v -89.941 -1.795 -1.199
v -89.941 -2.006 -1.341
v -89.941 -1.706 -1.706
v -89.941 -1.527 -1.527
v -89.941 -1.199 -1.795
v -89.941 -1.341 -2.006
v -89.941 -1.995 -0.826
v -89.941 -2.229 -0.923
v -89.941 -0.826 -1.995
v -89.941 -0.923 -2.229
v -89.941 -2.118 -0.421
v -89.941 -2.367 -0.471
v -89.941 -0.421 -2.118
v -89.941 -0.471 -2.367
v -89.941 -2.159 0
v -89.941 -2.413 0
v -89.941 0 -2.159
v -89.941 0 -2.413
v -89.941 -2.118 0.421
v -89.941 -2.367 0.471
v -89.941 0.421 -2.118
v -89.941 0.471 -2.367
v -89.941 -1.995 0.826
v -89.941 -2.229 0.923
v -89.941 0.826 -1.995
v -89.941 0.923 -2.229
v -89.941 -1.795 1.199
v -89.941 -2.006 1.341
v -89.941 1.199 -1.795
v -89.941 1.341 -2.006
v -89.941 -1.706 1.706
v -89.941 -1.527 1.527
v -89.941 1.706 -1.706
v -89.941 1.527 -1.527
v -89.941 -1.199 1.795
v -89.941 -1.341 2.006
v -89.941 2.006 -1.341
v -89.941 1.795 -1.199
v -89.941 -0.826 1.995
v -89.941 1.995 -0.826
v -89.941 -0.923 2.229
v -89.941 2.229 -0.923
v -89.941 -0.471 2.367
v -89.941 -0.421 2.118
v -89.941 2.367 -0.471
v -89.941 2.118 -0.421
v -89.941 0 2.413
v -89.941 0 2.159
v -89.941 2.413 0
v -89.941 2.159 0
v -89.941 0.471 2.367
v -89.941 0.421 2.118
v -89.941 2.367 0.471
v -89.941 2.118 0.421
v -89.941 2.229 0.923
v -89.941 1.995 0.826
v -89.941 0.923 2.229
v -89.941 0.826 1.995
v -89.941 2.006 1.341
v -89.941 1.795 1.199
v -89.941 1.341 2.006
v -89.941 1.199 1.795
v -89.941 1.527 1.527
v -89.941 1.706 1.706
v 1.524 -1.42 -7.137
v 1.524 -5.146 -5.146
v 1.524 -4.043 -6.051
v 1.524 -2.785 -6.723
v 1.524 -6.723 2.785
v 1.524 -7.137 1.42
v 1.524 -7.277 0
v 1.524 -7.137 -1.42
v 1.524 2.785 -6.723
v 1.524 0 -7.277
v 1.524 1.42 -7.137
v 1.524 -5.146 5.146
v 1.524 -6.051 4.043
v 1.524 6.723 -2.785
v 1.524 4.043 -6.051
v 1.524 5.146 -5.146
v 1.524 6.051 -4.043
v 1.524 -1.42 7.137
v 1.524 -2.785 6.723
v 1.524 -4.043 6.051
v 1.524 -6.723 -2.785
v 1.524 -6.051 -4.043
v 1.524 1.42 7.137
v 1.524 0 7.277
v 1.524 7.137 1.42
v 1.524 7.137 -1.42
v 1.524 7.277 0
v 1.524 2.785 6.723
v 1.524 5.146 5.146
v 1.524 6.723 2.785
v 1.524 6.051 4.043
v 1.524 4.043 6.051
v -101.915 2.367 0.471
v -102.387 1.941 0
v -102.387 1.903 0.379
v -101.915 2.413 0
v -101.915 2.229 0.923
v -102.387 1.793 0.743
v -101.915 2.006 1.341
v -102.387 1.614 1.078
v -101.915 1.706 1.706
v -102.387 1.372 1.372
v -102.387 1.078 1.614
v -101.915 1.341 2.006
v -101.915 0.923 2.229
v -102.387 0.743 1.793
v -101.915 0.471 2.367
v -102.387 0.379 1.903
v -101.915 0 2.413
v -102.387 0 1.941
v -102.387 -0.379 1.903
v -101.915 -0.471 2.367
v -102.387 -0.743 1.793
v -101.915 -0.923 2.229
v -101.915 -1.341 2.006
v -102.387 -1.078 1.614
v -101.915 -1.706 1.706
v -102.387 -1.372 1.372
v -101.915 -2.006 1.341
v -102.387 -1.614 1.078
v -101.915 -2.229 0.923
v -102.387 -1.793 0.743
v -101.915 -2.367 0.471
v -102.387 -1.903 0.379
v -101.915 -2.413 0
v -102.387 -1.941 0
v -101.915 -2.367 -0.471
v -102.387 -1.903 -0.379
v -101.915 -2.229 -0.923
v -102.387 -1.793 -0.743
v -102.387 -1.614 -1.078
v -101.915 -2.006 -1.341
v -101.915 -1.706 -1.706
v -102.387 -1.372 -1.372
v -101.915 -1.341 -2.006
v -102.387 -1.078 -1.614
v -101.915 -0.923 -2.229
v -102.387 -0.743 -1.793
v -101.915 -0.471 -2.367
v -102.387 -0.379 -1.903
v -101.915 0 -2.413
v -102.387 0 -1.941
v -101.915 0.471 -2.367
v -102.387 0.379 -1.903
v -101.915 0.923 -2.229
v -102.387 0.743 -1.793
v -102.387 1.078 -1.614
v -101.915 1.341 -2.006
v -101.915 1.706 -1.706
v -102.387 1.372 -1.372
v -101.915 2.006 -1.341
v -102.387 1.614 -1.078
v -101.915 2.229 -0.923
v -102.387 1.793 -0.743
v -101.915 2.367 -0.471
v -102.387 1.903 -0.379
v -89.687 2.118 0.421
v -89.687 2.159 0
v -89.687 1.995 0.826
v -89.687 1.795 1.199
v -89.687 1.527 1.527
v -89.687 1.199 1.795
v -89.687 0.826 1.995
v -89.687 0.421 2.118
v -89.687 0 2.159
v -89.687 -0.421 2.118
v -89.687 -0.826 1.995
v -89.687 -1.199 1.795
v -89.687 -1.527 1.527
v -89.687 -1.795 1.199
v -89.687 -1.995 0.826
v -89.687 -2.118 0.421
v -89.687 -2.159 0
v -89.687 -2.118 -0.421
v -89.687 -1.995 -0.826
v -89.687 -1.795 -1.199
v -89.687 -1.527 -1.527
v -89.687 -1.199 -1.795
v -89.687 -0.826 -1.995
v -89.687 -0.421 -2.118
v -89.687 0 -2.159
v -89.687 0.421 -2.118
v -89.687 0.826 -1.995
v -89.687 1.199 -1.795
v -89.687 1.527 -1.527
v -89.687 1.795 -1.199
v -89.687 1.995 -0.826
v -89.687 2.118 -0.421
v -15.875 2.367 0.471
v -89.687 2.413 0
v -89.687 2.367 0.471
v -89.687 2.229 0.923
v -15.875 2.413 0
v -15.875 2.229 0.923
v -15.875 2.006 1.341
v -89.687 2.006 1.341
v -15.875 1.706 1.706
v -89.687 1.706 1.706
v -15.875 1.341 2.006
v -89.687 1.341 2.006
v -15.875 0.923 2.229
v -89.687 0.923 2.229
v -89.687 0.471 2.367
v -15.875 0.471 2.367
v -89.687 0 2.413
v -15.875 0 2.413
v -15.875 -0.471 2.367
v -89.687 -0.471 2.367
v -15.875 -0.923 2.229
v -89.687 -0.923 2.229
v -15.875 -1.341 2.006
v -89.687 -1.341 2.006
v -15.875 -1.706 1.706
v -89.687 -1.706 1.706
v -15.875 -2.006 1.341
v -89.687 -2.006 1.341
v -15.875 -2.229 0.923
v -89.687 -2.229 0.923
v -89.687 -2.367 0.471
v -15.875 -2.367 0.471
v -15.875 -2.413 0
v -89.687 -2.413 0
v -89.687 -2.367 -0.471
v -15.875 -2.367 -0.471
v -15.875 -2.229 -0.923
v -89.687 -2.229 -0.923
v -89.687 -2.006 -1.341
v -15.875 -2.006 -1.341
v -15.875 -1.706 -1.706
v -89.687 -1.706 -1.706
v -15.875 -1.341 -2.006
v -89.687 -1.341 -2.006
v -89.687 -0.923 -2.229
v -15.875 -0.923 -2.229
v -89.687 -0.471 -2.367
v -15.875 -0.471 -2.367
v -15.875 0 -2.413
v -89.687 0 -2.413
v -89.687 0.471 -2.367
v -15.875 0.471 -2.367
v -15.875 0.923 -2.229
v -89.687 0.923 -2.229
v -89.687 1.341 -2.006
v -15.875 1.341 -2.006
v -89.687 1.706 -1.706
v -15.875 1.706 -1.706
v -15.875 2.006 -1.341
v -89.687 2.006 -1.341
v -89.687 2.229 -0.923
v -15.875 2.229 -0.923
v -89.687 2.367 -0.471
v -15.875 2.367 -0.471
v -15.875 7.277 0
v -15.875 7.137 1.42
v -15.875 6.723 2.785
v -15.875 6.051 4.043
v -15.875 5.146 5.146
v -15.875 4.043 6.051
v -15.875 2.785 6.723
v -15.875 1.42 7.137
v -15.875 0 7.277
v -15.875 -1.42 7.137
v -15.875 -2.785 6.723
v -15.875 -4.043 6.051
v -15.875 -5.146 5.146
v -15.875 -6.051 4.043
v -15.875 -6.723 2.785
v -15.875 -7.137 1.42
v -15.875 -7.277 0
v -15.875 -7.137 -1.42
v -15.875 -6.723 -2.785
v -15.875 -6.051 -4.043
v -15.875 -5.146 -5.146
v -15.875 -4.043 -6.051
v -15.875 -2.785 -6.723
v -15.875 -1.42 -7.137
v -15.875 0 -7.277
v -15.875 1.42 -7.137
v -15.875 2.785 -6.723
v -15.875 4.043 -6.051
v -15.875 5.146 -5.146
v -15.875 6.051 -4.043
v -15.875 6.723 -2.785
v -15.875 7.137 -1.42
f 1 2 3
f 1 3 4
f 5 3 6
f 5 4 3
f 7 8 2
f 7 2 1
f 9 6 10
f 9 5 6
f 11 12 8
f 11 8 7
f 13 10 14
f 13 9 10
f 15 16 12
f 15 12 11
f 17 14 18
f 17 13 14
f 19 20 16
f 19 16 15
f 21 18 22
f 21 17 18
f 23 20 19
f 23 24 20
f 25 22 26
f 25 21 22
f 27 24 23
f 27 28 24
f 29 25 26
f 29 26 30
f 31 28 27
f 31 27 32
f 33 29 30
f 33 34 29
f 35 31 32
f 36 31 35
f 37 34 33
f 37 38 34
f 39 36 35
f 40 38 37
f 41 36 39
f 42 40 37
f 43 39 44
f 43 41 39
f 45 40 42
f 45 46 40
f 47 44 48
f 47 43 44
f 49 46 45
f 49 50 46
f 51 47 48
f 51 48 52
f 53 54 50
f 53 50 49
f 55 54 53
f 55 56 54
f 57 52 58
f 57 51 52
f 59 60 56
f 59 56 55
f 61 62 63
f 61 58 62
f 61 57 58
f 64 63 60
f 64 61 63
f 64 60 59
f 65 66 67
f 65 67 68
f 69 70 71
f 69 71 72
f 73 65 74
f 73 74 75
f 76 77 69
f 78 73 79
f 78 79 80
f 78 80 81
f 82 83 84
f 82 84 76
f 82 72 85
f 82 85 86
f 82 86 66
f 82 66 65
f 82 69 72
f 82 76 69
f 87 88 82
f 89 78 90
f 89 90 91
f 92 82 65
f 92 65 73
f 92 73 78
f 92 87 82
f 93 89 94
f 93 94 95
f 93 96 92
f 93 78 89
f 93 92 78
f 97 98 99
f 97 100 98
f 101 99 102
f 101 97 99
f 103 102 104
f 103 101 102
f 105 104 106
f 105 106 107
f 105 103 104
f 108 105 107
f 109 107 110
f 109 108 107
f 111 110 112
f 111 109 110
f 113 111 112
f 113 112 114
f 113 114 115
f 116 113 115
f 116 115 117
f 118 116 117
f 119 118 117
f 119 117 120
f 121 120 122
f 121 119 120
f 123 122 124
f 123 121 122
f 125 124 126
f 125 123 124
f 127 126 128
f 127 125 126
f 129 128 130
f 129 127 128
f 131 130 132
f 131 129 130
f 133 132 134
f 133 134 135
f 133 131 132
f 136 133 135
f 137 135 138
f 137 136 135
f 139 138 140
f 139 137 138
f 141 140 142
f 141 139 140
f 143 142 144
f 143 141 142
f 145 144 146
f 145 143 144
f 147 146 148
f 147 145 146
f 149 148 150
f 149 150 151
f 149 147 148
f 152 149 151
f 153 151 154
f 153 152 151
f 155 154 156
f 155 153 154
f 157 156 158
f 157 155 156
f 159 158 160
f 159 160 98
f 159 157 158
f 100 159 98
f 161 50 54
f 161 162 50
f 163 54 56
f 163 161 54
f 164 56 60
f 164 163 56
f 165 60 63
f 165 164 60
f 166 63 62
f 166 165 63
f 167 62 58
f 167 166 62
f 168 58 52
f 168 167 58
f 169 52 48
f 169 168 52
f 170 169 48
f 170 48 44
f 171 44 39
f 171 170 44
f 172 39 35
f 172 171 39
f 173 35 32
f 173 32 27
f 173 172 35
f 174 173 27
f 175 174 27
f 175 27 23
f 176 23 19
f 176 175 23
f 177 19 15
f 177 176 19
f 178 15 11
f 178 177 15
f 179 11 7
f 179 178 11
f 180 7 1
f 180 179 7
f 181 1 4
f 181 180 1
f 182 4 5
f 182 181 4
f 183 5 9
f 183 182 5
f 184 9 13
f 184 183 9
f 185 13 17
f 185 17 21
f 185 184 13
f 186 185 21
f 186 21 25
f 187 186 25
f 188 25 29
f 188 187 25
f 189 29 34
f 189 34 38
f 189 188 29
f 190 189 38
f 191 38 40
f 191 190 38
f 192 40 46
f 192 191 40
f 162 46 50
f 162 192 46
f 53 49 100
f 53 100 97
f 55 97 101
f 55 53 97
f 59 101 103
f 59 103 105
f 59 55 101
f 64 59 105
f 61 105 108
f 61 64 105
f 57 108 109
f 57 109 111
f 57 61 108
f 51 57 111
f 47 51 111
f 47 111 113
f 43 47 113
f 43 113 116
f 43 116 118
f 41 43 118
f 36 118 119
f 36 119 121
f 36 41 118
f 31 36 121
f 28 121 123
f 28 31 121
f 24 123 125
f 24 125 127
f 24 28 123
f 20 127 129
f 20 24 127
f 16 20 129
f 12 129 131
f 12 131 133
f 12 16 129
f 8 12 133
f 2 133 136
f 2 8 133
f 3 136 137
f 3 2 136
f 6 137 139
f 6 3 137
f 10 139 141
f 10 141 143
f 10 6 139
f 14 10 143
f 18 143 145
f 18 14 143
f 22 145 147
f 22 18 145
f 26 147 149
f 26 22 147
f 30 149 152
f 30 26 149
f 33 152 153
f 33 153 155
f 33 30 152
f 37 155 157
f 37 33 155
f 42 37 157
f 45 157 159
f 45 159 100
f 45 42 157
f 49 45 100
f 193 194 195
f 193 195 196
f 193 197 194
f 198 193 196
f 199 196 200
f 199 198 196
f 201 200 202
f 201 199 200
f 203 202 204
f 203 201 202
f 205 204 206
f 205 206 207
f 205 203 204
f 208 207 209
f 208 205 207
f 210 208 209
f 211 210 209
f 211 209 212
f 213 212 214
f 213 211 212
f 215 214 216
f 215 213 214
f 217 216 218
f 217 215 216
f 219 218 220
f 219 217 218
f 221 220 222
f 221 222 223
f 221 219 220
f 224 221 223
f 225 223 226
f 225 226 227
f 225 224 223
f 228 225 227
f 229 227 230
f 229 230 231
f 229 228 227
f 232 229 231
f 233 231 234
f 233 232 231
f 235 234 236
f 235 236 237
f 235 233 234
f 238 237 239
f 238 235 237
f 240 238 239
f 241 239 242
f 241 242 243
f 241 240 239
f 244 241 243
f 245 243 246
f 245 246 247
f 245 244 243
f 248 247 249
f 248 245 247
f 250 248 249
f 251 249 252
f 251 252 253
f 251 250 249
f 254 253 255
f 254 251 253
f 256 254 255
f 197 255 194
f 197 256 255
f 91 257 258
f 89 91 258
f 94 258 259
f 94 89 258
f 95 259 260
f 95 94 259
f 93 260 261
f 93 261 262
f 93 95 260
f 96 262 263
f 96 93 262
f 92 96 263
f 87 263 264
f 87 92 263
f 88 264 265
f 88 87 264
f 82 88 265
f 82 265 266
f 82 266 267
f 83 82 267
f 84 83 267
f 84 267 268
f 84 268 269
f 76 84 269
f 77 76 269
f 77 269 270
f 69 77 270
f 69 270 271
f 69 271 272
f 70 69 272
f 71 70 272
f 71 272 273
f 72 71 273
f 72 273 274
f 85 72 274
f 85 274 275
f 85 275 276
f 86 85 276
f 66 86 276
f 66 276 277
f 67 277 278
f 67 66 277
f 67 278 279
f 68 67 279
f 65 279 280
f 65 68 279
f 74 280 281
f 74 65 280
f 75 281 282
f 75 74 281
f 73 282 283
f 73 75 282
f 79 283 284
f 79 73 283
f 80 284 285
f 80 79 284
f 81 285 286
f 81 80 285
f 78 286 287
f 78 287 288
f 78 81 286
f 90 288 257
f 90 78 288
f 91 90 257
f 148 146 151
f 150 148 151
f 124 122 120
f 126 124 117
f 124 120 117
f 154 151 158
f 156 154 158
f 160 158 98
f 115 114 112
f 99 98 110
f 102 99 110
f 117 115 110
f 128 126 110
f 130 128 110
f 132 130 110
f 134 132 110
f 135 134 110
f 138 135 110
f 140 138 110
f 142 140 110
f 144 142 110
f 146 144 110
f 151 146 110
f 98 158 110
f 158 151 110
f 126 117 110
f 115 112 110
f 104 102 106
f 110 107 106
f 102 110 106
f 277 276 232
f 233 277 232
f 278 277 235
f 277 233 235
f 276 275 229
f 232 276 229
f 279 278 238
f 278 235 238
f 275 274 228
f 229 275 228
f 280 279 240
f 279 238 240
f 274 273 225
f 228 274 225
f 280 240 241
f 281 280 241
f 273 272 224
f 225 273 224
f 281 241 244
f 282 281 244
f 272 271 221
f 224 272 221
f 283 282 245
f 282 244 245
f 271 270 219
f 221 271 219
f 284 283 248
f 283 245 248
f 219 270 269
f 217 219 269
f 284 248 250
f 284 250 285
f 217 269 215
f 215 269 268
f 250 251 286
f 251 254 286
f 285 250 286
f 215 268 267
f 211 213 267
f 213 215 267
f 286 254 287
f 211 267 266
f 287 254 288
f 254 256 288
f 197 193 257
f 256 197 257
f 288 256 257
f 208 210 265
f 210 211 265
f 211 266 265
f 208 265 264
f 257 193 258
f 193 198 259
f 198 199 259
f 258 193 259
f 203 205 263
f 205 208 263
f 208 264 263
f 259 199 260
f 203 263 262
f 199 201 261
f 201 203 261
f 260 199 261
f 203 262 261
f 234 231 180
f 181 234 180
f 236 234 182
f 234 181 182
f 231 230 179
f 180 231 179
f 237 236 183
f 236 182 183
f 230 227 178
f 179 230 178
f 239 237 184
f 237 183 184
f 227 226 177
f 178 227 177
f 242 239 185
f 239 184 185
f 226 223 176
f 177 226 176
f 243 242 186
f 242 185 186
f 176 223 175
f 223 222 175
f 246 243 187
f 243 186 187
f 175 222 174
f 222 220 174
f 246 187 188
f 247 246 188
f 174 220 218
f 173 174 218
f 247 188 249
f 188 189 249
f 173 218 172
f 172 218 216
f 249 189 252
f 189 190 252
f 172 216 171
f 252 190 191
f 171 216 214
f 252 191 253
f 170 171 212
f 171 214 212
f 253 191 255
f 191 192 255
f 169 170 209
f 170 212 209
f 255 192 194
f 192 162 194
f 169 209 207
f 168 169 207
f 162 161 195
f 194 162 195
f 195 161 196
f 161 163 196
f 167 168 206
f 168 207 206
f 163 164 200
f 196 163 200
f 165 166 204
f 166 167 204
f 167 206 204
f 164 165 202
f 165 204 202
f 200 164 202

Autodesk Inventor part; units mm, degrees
sketch "Sketch_3" plane through (0, 0, 0) normal (0, 0, 1) x (1, 0, 0)
  line L0 (0, 0) -> (-102.3874, 0)
  line L1 (-102.3874, 0) -> (-102.3874, 1.9406)
  line L2 (-102.3874, 1.9406) -> (-101.915, 2.413)
  line L3 (-101.915, 2.413) -> (0, 2.413)
  line L4 (0, 2.413) -> (0, 0)
  line L5 (0, 0) -> (-102.3874, 0)
revolve "Revolution1" add sketch "Sketch_3" angle 360 about axis through (0, 0, 0) along (1, 0, 0)
thread "Thread1" size "10-32 UNF" class "2A" standard "ANSI Unified Screw Threads" length 12.446 offset 89.9414
sketch "Sketch_17" plane through (0, 0, 0) normal (0, 0, 1) x (1, 0, 0)
  line L0 (102.3874, 0) -> (-102.3874, 0)
  line L1 (-89.9414, 2.413) -> (-89.9414, 2.159)
  line L2 (-89.9414, 2.159) -> (-89.6874, 2.159)
  line L3 (-89.6874, 2.159) -> (-89.6874, 2.413)
  line L4 (-89.6874, 2.413) -> (-89.9414, 2.413)
revolve "Revolution2" cut sketch "Sketch_17" angle 360 about axis through (102.3874, 0, 0) along (1, 0, 0)
sketch "Sketch_12" plane through (0, 0, 0) normal (0, 0, 1) x (1, 0, 0)
  line L0 (1.524, 0) -> (-15.875, 0)
  line L1 (-15.875, 0) -> (-15.875, 7.2771)
  line L2 (-15.875, 7.2771) -> (1.524, 7.2771)
  line L3 (1.524, 7.2771) -> (1.524, 0)
  line L4 (1.524, 0) -> (-15.875, 0)
revolve "Revolution3" add sketch "Sketch_12" angle 360 about axis through (1.524, 0, 0) along (1, 0, 0)
ref_plane "h1_XY" through (-102.3874, 0, 0) normal (0, 1, 0) x (1, 0, 0)
ref_plane "h1_YZ" through (-102.3874, 0, 0) normal (1, 0, 0) x (0, 0, -1)
ref_plane "h1_ZX" through (-102.3874, 0, 0) normal (0, 0, -1) x (0, 1, 0)
ref_plane "h2_XY" through (-89.6874, 0, 0) normal (0, 1, 0) x (1, 0, 0)
ref_plane "h2_YZ" through (-89.6874, 0, 0) normal (1, 0, 0) x (0, 0, -1)
ref_plane "h2_ZX" through (-89.6874, 0, 0) normal (0, 0, -1) x (0, 1, 0)
ref_plane "k1_XY" through (-102.3874, 0, -2.413) normal (0, 1, 0) x (1, 0, 0)
ref_plane "k1_YZ" through (-102.3874, 0, -2.413) normal (1, 0, 0) x (0, 0, -1)
ref_plane "k1_ZX" through (-102.3874, 0, -2.413) normal (0, 0, -1) x (0, 1, 0)
ref_plane "k2_XY" through (-102.3874, 0, 2.413) normal (0, 1, 0) x (1, 0, 0)
ref_plane "k2_YZ" through (-102.3874, 0, 2.413) normal (1, 0, 0) x (0, 0, -1)
ref_plane "k2_ZX" through (-102.3874, 0, 2.413) normal (0, 0, -1) x (0, 1, 0)
ref_plane "start_XY" through (-89.6874, 0, 0) normal (0, 1, 0) x (1, 0, 0)
ref_plane "start_YZ" through (-89.6874, 0, 0) normal (1, 0, 0) x (0, 0, -1)
ref_plane "start_ZX" through (-89.6874, 0, 0) normal (0, 0, -1) x (0, 1, 0)
ref_plane "to_prc_XY" through (-89.6874, 0, 0) normal (1, 0, 0) x (0, 0, -1)
ref_plane "to_prc_YZ" through (-89.6874, 0, 0) normal (0, 0, -1) x (0, 1, 0)
ref_plane "to_prc_ZX" through (-89.6874, 0, 0) normal (0, 1, 0) x (1, 0, 0)
ref_plane "to_rod_guide_XY" through (-102.3874, 0, 0) normal (1, 0, 0) x (0, 0, -1)
ref_plane "to_rod_guide_YZ" through (-102.3874, 0, 0) normal (0, 0, -1) x (0, 1, 0)
ref_plane "to_rod_guide_ZX" through (-102.3874, 0, 0) normal (0, 1, 0) x (1, 0, 0)
properties part number "D-75081.5-0.25-4.031-3pos"
